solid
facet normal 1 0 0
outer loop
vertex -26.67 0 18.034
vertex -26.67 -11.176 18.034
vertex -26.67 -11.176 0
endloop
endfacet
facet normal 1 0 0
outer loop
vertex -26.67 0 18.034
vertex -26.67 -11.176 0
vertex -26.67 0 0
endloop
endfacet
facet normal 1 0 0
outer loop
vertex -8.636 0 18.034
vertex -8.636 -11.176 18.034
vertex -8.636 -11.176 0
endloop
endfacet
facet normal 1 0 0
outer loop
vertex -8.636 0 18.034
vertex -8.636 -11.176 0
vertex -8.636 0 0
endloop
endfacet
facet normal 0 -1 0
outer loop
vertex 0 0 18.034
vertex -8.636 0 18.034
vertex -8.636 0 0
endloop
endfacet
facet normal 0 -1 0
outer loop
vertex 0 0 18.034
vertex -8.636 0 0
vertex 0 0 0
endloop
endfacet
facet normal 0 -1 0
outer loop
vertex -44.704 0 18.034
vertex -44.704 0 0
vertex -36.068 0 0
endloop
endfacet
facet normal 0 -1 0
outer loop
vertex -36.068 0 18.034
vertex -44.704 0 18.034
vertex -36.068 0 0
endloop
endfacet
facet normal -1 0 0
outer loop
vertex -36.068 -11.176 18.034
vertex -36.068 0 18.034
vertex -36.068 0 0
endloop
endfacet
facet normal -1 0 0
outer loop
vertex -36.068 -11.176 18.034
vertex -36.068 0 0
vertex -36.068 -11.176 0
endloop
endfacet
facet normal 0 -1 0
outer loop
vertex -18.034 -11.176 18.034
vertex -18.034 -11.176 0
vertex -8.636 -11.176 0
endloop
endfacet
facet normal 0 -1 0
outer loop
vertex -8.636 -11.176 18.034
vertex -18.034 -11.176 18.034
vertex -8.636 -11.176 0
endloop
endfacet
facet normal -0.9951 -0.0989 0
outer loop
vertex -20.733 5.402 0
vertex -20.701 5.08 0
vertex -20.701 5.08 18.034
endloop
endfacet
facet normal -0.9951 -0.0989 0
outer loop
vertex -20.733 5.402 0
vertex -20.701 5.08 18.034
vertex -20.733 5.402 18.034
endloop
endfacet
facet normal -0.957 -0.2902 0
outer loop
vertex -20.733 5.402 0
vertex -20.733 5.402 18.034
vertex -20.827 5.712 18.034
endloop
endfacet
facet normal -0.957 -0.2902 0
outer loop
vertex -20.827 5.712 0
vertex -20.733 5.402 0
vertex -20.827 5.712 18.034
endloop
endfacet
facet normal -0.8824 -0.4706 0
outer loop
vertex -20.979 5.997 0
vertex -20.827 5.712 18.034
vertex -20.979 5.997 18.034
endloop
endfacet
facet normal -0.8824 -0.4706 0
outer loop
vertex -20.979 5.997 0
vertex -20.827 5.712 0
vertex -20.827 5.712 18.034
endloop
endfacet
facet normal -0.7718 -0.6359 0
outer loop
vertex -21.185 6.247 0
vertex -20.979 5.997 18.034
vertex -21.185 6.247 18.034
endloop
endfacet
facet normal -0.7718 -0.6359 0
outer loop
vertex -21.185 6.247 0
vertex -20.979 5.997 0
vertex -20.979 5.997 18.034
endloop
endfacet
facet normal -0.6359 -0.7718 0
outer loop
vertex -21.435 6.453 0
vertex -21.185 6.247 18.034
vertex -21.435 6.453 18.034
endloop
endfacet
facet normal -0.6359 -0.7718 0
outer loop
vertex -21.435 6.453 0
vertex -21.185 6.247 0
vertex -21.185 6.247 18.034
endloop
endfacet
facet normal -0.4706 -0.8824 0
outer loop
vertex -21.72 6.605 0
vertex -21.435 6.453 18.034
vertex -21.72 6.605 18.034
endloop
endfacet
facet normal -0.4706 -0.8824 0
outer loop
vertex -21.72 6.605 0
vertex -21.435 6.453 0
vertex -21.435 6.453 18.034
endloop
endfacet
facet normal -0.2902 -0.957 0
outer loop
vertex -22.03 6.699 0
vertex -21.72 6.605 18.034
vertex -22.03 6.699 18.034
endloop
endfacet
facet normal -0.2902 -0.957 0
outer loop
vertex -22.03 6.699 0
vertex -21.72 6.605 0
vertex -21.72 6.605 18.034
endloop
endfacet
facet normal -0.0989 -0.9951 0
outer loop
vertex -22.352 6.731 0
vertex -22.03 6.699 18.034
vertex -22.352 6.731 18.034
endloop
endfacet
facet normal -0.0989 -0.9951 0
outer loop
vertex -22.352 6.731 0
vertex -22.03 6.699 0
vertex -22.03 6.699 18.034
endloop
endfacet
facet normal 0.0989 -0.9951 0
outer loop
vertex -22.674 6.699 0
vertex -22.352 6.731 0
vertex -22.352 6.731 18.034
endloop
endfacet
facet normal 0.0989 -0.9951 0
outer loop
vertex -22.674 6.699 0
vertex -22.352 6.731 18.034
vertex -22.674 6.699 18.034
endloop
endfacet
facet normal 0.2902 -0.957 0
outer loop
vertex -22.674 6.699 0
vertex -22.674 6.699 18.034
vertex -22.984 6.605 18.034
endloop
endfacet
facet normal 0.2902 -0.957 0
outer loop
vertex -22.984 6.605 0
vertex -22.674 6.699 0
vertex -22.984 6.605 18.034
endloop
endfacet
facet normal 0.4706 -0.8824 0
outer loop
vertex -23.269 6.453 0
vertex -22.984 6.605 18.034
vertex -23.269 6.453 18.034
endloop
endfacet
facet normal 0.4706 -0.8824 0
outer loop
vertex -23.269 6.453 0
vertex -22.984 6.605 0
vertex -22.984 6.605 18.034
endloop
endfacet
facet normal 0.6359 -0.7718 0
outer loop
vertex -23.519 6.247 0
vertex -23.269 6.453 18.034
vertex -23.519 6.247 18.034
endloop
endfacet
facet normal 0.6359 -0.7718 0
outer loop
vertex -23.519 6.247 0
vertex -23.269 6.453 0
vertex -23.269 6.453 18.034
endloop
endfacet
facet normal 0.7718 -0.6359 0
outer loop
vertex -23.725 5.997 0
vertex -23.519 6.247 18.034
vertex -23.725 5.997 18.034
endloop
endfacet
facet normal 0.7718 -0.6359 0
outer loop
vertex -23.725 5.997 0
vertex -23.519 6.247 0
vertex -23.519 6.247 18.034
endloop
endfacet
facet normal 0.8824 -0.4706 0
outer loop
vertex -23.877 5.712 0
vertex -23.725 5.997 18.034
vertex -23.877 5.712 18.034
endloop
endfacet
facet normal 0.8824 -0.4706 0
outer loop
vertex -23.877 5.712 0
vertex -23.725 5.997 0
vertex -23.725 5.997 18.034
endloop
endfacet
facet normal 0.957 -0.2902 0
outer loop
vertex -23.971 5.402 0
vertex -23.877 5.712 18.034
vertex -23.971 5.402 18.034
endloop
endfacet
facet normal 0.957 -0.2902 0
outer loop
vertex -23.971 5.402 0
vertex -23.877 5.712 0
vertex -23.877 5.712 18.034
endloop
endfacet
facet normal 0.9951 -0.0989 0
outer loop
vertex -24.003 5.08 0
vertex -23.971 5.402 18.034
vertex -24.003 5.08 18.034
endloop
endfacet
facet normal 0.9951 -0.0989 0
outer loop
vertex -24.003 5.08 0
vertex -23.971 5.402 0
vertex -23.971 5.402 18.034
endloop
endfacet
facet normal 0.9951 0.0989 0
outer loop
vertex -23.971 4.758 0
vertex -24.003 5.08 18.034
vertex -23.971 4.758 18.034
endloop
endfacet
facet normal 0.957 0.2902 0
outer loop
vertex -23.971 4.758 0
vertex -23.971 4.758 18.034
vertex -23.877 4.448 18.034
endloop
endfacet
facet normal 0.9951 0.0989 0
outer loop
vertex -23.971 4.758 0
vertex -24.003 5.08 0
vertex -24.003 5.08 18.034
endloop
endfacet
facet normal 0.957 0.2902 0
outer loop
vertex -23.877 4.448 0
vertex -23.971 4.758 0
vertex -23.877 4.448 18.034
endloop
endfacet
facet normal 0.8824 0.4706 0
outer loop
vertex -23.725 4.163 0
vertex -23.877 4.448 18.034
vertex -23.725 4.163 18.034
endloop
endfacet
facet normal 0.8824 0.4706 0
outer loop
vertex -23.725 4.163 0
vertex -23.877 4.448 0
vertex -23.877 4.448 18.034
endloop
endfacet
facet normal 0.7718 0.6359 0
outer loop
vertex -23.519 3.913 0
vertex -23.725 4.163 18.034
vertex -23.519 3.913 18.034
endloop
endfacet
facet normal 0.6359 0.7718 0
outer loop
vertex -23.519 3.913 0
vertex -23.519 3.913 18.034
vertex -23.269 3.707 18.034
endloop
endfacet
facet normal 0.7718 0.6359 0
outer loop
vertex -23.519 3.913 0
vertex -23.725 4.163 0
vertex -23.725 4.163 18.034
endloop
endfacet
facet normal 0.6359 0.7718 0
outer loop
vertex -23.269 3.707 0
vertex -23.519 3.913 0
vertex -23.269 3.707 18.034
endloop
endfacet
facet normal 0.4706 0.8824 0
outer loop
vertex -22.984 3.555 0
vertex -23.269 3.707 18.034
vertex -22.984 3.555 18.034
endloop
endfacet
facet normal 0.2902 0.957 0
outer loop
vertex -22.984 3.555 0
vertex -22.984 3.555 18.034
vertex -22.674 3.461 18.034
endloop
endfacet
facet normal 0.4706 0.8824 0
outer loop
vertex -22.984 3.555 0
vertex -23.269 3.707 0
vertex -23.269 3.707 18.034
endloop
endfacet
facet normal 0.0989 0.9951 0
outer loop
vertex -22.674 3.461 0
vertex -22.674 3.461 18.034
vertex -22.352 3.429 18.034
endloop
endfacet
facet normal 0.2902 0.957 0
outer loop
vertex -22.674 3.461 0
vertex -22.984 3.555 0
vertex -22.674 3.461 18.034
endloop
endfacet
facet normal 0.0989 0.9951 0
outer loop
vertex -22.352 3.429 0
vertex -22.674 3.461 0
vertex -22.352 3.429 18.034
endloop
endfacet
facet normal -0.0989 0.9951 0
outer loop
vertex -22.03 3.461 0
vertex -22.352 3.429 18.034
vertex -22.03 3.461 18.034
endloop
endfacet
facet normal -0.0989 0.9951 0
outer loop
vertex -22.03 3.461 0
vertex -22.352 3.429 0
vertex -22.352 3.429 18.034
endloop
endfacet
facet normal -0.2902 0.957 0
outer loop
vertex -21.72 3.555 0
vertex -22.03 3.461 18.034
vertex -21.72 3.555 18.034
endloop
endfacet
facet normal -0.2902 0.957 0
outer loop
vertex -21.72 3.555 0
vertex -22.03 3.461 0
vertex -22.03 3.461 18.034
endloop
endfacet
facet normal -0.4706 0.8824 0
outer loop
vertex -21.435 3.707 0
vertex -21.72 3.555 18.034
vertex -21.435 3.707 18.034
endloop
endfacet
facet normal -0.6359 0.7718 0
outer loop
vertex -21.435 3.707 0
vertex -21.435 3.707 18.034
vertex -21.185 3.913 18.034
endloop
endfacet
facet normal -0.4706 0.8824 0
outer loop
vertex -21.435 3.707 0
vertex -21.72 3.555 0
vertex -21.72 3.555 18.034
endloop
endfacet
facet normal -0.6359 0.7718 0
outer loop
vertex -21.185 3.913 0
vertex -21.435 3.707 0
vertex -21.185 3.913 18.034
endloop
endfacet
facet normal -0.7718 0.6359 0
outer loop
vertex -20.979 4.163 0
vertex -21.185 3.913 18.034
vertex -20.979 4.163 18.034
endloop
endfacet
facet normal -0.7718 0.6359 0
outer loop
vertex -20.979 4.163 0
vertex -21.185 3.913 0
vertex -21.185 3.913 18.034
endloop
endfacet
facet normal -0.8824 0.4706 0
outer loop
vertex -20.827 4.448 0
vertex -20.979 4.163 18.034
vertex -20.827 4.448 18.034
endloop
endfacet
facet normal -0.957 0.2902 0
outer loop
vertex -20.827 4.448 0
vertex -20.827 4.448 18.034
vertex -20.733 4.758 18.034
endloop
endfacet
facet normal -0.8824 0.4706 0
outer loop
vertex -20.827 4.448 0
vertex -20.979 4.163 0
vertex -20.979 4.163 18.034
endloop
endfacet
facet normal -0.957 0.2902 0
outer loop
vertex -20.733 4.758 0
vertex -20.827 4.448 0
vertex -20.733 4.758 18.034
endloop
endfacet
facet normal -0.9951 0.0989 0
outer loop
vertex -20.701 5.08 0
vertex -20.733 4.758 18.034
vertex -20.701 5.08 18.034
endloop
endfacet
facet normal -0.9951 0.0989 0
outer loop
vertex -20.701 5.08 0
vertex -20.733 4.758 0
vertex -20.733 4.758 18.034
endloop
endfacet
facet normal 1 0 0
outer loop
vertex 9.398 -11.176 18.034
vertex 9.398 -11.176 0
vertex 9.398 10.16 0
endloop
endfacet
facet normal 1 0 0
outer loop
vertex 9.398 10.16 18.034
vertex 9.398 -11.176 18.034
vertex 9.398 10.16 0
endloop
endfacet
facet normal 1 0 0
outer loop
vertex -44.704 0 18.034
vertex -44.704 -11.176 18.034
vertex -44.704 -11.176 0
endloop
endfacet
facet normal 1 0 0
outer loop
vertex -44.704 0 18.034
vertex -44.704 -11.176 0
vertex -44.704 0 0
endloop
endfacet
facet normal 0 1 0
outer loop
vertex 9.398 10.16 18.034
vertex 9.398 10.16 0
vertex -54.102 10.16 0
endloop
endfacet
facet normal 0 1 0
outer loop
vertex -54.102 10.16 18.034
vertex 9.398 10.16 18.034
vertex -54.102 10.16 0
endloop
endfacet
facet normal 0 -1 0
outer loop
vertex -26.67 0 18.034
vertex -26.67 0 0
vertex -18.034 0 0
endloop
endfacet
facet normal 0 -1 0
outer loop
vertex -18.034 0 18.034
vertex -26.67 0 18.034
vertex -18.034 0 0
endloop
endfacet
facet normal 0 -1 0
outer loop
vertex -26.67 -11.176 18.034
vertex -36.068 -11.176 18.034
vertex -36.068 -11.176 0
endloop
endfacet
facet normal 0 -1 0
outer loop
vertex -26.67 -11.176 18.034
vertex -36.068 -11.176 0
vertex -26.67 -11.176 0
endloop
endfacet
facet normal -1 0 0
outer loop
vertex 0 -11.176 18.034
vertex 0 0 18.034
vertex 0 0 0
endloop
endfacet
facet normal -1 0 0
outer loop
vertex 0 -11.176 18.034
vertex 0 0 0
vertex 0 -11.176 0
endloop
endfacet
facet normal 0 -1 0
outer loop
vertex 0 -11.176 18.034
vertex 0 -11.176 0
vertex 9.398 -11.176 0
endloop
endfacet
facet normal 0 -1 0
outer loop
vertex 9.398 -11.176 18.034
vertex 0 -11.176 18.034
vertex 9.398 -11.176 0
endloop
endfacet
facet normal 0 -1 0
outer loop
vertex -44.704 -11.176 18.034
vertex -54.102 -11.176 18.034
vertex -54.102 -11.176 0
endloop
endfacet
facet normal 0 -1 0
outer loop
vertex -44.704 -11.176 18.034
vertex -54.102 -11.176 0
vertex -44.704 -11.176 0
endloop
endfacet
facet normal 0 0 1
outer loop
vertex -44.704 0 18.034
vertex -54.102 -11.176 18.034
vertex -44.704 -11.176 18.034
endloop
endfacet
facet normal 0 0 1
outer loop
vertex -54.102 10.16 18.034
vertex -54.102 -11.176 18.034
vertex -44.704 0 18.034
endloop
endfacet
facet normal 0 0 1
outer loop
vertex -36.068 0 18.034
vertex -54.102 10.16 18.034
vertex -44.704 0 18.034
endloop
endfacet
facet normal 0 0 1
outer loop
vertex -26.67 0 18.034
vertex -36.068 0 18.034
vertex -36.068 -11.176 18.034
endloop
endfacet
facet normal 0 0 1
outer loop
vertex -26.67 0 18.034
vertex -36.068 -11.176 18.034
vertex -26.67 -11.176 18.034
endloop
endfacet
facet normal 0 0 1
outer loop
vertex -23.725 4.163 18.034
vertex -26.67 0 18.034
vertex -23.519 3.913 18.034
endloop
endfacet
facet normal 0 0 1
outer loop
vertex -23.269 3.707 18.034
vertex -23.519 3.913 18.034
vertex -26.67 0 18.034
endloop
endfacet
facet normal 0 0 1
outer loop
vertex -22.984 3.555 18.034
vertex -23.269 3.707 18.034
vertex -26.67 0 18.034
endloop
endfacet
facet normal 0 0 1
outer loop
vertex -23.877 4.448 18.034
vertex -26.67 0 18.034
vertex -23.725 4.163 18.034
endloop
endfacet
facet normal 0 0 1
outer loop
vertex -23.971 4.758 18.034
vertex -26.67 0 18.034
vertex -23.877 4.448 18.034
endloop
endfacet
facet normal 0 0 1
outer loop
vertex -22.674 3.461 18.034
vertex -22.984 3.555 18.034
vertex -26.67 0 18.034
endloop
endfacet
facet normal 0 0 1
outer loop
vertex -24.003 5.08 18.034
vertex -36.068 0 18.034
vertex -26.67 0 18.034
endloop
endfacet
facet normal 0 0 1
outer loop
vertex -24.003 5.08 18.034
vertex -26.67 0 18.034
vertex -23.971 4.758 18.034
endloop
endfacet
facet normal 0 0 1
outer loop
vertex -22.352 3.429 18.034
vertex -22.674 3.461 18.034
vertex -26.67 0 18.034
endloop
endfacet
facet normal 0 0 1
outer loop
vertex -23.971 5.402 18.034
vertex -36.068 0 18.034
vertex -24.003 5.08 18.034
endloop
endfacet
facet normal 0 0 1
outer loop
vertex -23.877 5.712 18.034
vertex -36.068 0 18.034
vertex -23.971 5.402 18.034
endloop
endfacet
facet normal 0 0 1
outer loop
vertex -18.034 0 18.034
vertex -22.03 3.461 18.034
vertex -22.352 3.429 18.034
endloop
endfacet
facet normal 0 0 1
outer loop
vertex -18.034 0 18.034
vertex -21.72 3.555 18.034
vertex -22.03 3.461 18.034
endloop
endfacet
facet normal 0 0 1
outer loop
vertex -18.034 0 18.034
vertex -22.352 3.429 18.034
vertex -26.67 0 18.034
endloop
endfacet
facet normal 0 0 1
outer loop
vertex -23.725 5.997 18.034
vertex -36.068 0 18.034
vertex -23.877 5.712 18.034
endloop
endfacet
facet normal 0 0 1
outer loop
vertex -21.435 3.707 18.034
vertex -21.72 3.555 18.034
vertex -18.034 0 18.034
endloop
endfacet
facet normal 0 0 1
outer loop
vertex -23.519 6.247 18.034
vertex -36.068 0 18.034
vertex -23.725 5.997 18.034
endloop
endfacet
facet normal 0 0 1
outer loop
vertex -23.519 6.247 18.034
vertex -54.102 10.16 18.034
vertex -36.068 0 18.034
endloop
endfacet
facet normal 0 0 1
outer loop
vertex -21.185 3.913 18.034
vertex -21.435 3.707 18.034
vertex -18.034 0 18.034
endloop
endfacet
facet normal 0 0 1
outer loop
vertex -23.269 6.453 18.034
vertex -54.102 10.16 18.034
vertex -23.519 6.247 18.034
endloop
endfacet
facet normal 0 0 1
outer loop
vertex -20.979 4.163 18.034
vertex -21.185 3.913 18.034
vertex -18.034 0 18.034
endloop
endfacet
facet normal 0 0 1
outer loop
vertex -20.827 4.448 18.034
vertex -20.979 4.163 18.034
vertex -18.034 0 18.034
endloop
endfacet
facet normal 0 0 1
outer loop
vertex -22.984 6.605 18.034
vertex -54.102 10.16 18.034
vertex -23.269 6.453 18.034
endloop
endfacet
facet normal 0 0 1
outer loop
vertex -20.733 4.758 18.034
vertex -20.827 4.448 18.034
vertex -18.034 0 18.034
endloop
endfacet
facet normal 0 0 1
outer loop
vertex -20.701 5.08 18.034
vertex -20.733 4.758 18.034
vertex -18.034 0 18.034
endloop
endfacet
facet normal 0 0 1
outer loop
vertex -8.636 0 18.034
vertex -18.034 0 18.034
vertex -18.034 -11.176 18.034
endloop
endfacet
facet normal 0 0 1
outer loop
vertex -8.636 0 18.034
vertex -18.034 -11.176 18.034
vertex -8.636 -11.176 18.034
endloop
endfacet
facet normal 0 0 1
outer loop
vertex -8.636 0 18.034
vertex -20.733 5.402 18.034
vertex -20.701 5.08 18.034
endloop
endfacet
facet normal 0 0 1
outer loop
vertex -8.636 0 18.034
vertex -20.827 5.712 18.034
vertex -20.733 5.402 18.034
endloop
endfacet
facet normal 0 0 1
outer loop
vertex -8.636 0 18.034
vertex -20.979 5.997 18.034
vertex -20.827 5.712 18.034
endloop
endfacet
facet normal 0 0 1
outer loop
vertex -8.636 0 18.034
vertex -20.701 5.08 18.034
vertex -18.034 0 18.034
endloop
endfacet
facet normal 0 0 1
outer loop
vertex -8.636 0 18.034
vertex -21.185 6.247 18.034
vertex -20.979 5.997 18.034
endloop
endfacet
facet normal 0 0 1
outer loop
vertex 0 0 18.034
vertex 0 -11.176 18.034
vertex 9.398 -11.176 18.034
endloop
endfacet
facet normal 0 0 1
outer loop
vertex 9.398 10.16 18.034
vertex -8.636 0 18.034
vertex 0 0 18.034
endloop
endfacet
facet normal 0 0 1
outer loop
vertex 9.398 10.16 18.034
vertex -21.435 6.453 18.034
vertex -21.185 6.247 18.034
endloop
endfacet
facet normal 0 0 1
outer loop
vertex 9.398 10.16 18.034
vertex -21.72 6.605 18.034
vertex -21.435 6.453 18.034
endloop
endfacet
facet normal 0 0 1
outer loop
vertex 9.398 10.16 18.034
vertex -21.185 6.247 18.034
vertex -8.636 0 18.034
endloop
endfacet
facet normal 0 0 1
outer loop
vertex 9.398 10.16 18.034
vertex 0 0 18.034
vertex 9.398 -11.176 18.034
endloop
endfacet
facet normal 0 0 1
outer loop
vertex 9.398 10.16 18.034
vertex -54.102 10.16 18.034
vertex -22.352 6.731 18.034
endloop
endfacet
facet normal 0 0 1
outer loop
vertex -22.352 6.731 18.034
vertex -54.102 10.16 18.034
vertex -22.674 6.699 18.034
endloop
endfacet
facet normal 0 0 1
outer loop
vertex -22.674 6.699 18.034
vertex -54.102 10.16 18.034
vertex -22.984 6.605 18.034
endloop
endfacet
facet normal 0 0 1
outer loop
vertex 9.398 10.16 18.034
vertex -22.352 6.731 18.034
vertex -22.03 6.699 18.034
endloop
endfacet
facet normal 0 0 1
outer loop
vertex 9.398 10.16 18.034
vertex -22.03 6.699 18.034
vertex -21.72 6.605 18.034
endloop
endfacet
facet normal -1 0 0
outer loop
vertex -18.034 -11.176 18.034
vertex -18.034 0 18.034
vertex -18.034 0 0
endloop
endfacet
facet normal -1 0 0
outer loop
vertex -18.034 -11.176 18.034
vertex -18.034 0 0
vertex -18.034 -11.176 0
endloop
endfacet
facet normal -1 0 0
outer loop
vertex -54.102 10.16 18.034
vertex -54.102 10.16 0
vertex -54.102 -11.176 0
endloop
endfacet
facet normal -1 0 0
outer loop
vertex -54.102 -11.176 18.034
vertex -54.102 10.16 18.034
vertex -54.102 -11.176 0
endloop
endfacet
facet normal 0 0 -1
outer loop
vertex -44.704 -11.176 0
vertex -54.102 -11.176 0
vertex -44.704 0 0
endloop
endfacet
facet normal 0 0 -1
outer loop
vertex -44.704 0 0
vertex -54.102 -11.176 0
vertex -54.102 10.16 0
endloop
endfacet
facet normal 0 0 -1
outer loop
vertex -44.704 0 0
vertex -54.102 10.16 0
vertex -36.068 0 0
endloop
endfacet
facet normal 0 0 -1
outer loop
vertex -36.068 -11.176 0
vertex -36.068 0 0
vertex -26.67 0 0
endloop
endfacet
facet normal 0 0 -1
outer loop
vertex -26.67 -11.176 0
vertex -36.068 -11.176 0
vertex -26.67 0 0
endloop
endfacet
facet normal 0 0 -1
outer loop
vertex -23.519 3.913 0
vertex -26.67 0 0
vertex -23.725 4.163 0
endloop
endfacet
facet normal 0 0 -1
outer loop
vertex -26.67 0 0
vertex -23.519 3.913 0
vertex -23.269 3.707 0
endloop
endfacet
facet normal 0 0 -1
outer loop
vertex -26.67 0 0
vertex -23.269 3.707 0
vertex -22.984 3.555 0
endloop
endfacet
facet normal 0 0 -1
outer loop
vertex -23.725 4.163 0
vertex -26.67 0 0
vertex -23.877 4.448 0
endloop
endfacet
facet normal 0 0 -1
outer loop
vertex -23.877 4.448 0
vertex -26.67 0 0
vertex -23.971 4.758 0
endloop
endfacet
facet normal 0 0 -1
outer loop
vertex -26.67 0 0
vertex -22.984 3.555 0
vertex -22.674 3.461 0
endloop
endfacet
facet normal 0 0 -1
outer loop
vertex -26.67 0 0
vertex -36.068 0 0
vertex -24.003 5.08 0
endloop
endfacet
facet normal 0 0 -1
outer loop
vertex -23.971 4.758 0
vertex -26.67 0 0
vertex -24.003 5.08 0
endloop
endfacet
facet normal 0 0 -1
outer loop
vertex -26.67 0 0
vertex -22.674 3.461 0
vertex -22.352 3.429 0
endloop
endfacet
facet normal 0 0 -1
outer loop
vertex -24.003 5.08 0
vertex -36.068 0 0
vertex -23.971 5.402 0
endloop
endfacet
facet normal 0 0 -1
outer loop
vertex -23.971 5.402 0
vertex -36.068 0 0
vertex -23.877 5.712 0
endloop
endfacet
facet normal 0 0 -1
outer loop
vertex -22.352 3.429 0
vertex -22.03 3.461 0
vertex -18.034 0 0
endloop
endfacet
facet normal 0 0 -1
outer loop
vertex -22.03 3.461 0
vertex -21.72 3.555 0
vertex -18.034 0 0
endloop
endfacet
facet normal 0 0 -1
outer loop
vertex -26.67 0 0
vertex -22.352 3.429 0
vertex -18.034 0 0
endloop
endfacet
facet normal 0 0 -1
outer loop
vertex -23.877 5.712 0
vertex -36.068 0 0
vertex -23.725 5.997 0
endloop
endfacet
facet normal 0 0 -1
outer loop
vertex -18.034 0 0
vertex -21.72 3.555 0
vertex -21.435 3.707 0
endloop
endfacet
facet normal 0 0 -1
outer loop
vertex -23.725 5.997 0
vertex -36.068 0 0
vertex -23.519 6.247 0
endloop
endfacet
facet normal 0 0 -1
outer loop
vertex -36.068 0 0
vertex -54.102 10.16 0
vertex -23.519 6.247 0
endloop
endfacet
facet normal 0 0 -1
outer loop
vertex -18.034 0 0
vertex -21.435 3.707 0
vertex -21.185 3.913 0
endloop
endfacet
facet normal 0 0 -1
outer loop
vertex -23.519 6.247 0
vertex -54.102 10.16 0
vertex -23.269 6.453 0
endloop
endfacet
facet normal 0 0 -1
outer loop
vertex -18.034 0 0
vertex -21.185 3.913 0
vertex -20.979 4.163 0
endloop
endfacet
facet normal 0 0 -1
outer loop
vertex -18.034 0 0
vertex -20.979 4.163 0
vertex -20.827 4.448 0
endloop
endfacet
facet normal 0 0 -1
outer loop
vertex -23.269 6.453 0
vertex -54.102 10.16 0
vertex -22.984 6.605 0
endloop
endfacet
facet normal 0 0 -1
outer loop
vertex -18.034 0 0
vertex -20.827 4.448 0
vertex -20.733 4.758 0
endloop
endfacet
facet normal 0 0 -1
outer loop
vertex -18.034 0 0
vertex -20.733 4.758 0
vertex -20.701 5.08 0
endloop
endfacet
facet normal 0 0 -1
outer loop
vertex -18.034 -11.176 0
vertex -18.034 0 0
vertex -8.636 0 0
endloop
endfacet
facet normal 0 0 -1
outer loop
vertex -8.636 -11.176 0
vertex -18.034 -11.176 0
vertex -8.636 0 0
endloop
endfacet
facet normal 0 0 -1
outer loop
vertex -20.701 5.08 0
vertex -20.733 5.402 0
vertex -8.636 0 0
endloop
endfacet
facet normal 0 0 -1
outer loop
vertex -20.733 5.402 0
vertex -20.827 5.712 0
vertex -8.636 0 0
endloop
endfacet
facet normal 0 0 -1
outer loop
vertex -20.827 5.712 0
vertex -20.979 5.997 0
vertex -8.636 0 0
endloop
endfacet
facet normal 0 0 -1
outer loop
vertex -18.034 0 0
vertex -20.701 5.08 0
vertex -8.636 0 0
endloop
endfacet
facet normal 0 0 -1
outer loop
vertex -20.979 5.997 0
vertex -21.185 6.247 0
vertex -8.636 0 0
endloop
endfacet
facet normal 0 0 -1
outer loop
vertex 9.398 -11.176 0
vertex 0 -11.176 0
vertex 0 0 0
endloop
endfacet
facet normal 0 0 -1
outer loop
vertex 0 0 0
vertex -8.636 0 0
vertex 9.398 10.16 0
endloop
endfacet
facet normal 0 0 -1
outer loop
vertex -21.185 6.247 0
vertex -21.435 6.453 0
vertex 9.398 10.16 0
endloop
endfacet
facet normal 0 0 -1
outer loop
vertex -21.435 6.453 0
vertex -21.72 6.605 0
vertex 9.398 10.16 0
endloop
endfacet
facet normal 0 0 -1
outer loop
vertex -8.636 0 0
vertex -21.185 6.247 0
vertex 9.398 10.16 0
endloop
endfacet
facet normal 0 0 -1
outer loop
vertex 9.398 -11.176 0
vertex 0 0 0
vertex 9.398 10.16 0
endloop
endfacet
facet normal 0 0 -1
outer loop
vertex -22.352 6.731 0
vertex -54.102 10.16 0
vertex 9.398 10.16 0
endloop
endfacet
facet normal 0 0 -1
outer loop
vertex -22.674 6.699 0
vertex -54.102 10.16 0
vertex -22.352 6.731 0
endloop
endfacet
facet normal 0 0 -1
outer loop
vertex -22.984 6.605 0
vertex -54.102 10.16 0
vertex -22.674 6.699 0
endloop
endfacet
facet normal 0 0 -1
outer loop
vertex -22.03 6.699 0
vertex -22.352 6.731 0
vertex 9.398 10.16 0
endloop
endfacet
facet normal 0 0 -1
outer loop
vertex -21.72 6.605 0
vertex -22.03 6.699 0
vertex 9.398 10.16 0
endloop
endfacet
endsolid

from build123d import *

# Parameters (mm, degrees)
F0_R     = 1.651
F1_DEPTH = 18.034


with BuildPart() as f1:
    # F0 (on Top) → F1 (new body)
    with BuildSketch(Plane.XY):
        Polygon((-54.102, 10.16), (-54.102, 0), (-54.102, -11.176), (-44.704, -11.176), (-44.704, 0), (-36.068, 0), (-36.068, -11.176), (-26.67, -11.176), (-26.67, 0), (-18.034, 0), (-18.034, -11.176), (-8.636, -11.176), (-8.636, 0), (0, 0), (0, -11.176), (9.398, -11.176), (9.398, 10.16), align=None)
        with Locations((-22.352, 5.08)):
            Circle(F0_R, mode=Mode.SUBTRACT)
    extrude(amount=F1_DEPTH)


solid = f1.part
